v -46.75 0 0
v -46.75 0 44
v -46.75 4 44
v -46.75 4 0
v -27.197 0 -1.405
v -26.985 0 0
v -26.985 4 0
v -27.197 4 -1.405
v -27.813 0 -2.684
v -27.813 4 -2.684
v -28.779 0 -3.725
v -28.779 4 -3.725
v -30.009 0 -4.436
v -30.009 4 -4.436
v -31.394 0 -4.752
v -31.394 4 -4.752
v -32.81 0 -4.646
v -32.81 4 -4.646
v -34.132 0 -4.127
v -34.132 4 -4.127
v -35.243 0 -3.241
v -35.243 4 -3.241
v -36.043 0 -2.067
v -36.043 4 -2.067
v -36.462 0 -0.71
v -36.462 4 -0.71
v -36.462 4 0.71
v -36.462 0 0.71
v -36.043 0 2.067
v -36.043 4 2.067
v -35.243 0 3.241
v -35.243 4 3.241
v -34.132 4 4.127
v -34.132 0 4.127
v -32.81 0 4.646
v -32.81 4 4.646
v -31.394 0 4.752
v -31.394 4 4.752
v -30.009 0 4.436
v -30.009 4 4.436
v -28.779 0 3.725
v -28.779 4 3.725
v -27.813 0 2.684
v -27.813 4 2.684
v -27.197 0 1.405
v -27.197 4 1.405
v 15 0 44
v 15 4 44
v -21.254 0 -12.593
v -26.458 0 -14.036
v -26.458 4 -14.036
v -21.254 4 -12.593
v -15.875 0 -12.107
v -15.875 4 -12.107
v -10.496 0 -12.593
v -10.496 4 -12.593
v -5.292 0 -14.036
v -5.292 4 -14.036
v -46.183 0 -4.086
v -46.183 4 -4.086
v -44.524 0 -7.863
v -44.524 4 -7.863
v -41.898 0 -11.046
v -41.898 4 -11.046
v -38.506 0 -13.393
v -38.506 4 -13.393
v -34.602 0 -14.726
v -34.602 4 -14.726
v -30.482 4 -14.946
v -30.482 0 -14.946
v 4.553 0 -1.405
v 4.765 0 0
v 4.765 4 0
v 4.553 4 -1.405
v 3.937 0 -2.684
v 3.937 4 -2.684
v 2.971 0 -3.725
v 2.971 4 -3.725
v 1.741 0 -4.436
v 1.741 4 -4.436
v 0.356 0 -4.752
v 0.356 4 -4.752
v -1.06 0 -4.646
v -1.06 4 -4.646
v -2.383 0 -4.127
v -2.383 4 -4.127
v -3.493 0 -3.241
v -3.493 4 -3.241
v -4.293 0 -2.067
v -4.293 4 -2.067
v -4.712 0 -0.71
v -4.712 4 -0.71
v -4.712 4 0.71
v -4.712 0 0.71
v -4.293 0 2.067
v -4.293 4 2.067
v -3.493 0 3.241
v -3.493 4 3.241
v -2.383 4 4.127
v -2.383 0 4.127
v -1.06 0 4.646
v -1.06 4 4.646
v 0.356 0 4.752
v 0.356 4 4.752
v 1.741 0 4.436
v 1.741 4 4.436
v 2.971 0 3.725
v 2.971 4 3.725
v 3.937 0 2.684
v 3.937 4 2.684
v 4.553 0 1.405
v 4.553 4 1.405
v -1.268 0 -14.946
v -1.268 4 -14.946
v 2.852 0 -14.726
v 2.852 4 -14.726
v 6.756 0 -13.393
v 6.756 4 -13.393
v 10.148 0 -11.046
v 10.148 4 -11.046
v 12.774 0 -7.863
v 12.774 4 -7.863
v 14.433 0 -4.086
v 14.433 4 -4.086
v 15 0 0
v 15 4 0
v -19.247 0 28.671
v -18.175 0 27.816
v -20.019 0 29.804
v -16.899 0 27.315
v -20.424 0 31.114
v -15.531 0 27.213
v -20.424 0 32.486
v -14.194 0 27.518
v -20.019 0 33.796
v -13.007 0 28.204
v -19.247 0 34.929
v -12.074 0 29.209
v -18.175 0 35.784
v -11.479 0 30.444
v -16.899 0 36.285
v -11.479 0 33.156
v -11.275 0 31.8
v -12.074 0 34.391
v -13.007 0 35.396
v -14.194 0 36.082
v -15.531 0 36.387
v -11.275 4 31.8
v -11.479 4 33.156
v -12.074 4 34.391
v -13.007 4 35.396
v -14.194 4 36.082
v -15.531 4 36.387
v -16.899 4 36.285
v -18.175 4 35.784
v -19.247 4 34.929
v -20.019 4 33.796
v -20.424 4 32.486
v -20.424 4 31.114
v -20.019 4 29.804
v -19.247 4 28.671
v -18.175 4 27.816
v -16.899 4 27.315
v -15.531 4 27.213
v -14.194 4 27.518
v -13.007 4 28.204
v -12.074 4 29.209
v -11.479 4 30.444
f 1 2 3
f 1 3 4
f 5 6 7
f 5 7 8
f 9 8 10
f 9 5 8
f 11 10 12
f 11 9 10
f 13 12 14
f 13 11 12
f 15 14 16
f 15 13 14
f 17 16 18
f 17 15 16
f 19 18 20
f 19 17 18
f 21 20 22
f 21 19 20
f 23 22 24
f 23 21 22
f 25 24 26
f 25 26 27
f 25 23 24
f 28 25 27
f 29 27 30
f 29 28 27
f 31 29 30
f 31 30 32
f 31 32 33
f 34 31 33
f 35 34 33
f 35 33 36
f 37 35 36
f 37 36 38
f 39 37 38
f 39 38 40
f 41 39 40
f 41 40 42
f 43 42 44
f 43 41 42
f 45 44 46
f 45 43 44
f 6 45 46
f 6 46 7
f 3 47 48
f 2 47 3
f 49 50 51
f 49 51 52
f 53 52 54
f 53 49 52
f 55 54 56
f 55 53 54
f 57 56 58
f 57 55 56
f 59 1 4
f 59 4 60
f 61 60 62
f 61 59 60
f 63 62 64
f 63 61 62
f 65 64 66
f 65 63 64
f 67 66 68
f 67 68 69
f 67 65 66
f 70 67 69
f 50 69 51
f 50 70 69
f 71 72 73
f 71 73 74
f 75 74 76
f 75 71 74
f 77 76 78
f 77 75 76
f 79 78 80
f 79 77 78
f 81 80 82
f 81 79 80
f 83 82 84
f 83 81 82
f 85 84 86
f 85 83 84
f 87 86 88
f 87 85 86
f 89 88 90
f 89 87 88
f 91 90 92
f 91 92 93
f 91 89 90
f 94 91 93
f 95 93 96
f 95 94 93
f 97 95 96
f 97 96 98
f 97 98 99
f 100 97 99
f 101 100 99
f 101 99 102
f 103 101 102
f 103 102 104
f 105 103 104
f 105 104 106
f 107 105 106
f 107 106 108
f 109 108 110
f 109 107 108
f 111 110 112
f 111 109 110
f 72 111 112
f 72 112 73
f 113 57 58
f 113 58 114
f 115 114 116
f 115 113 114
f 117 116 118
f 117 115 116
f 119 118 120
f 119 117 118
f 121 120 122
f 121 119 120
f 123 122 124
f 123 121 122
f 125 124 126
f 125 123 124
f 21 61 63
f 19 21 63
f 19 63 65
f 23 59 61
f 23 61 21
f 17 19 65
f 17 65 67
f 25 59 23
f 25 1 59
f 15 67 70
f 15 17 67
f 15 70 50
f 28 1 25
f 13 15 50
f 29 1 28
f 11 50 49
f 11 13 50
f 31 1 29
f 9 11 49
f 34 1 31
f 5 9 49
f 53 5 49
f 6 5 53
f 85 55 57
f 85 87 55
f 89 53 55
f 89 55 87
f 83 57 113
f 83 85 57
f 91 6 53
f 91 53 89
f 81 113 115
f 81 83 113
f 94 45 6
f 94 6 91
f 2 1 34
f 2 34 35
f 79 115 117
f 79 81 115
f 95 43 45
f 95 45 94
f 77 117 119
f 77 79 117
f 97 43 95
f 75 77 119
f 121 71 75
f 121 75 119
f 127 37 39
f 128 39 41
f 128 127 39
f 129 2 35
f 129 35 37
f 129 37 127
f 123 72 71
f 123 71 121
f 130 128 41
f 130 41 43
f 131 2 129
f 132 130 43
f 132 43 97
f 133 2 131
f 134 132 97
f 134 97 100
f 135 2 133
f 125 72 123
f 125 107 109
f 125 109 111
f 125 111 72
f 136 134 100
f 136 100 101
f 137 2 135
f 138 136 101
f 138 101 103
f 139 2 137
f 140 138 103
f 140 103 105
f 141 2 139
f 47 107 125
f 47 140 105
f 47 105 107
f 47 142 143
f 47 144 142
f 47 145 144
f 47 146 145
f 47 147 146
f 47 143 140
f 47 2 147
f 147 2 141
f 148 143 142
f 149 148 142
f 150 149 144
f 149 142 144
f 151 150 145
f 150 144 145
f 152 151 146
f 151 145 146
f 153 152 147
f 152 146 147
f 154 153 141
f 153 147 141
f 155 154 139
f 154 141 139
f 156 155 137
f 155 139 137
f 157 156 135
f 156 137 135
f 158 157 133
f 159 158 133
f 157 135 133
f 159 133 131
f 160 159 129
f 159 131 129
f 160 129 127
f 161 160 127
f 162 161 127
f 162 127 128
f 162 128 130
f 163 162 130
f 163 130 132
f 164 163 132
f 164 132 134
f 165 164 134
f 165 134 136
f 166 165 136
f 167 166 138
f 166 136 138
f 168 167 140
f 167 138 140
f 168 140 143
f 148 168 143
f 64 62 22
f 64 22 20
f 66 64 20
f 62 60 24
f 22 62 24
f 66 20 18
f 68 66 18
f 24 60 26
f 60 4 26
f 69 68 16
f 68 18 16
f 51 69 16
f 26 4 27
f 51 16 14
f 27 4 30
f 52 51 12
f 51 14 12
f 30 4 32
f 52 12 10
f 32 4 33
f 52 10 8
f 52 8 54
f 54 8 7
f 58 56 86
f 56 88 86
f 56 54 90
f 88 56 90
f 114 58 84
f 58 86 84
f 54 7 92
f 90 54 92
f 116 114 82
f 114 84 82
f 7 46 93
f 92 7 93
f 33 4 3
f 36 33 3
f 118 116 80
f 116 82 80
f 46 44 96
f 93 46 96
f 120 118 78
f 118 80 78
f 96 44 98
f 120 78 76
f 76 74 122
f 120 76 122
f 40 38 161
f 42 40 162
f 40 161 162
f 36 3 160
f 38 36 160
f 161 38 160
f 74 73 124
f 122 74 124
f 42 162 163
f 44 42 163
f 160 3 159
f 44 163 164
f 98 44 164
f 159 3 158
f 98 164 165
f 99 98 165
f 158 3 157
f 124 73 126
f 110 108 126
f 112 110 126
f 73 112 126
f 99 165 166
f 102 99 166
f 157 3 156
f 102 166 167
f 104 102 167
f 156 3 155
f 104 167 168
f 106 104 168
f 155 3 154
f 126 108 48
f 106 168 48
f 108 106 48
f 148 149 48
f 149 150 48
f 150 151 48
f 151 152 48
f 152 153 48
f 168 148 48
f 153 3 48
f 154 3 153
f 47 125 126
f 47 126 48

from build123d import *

# Parameters (mm, degrees)
F0_R     = 4.6
F1_DEPTH = 4


with BuildPart() as f1:
    # F0 (on Front) → F1 (new body)
    with BuildSketch(Plane.XZ):
        with BuildLine():
            Line((-46.75, 31.8), (-46.75, 0))
            ThreePointArc((-46.75, 0), (-40.283024, -12.33643), (-26.458333, -14.035607))
            ThreePointArc((-26.458333, -14.035607), (-15.875, -12.106821), (-5.291667, -14.035607))
            ThreePointArc((-5.291667, -14.035607), (8.533024, -12.33643), (15, 0))
            Line((15, 0), (15, 31.8))
            Line((15, 31.8), (15, 44))
            Line((15, 44), (-46.75, 44))
            Line((-46.75, 44), (-46.75, 31.8))
        make_face()
        with BuildLine():
            ThreePointArc((-36.515, 0), (-31.75, 4.765), (-26.985, 0))
            ThreePointArc((-26.985, 0), (-31.75, -4.765), (-36.515, 0))
        make_face(mode=Mode.SUBTRACT)
        with BuildLine():
            ThreePointArc((-4.765, 0), (0, 4.765), (4.765, 0))
            ThreePointArc((4.765, 0), (0, -4.765), (-4.765, 0))
        make_face(mode=Mode.SUBTRACT)
        with Locations((-15.875, 31.8)):
            Circle(F0_R, mode=Mode.SUBTRACT)
    extrude(amount=-F1_DEPTH)


solid = f1.part
